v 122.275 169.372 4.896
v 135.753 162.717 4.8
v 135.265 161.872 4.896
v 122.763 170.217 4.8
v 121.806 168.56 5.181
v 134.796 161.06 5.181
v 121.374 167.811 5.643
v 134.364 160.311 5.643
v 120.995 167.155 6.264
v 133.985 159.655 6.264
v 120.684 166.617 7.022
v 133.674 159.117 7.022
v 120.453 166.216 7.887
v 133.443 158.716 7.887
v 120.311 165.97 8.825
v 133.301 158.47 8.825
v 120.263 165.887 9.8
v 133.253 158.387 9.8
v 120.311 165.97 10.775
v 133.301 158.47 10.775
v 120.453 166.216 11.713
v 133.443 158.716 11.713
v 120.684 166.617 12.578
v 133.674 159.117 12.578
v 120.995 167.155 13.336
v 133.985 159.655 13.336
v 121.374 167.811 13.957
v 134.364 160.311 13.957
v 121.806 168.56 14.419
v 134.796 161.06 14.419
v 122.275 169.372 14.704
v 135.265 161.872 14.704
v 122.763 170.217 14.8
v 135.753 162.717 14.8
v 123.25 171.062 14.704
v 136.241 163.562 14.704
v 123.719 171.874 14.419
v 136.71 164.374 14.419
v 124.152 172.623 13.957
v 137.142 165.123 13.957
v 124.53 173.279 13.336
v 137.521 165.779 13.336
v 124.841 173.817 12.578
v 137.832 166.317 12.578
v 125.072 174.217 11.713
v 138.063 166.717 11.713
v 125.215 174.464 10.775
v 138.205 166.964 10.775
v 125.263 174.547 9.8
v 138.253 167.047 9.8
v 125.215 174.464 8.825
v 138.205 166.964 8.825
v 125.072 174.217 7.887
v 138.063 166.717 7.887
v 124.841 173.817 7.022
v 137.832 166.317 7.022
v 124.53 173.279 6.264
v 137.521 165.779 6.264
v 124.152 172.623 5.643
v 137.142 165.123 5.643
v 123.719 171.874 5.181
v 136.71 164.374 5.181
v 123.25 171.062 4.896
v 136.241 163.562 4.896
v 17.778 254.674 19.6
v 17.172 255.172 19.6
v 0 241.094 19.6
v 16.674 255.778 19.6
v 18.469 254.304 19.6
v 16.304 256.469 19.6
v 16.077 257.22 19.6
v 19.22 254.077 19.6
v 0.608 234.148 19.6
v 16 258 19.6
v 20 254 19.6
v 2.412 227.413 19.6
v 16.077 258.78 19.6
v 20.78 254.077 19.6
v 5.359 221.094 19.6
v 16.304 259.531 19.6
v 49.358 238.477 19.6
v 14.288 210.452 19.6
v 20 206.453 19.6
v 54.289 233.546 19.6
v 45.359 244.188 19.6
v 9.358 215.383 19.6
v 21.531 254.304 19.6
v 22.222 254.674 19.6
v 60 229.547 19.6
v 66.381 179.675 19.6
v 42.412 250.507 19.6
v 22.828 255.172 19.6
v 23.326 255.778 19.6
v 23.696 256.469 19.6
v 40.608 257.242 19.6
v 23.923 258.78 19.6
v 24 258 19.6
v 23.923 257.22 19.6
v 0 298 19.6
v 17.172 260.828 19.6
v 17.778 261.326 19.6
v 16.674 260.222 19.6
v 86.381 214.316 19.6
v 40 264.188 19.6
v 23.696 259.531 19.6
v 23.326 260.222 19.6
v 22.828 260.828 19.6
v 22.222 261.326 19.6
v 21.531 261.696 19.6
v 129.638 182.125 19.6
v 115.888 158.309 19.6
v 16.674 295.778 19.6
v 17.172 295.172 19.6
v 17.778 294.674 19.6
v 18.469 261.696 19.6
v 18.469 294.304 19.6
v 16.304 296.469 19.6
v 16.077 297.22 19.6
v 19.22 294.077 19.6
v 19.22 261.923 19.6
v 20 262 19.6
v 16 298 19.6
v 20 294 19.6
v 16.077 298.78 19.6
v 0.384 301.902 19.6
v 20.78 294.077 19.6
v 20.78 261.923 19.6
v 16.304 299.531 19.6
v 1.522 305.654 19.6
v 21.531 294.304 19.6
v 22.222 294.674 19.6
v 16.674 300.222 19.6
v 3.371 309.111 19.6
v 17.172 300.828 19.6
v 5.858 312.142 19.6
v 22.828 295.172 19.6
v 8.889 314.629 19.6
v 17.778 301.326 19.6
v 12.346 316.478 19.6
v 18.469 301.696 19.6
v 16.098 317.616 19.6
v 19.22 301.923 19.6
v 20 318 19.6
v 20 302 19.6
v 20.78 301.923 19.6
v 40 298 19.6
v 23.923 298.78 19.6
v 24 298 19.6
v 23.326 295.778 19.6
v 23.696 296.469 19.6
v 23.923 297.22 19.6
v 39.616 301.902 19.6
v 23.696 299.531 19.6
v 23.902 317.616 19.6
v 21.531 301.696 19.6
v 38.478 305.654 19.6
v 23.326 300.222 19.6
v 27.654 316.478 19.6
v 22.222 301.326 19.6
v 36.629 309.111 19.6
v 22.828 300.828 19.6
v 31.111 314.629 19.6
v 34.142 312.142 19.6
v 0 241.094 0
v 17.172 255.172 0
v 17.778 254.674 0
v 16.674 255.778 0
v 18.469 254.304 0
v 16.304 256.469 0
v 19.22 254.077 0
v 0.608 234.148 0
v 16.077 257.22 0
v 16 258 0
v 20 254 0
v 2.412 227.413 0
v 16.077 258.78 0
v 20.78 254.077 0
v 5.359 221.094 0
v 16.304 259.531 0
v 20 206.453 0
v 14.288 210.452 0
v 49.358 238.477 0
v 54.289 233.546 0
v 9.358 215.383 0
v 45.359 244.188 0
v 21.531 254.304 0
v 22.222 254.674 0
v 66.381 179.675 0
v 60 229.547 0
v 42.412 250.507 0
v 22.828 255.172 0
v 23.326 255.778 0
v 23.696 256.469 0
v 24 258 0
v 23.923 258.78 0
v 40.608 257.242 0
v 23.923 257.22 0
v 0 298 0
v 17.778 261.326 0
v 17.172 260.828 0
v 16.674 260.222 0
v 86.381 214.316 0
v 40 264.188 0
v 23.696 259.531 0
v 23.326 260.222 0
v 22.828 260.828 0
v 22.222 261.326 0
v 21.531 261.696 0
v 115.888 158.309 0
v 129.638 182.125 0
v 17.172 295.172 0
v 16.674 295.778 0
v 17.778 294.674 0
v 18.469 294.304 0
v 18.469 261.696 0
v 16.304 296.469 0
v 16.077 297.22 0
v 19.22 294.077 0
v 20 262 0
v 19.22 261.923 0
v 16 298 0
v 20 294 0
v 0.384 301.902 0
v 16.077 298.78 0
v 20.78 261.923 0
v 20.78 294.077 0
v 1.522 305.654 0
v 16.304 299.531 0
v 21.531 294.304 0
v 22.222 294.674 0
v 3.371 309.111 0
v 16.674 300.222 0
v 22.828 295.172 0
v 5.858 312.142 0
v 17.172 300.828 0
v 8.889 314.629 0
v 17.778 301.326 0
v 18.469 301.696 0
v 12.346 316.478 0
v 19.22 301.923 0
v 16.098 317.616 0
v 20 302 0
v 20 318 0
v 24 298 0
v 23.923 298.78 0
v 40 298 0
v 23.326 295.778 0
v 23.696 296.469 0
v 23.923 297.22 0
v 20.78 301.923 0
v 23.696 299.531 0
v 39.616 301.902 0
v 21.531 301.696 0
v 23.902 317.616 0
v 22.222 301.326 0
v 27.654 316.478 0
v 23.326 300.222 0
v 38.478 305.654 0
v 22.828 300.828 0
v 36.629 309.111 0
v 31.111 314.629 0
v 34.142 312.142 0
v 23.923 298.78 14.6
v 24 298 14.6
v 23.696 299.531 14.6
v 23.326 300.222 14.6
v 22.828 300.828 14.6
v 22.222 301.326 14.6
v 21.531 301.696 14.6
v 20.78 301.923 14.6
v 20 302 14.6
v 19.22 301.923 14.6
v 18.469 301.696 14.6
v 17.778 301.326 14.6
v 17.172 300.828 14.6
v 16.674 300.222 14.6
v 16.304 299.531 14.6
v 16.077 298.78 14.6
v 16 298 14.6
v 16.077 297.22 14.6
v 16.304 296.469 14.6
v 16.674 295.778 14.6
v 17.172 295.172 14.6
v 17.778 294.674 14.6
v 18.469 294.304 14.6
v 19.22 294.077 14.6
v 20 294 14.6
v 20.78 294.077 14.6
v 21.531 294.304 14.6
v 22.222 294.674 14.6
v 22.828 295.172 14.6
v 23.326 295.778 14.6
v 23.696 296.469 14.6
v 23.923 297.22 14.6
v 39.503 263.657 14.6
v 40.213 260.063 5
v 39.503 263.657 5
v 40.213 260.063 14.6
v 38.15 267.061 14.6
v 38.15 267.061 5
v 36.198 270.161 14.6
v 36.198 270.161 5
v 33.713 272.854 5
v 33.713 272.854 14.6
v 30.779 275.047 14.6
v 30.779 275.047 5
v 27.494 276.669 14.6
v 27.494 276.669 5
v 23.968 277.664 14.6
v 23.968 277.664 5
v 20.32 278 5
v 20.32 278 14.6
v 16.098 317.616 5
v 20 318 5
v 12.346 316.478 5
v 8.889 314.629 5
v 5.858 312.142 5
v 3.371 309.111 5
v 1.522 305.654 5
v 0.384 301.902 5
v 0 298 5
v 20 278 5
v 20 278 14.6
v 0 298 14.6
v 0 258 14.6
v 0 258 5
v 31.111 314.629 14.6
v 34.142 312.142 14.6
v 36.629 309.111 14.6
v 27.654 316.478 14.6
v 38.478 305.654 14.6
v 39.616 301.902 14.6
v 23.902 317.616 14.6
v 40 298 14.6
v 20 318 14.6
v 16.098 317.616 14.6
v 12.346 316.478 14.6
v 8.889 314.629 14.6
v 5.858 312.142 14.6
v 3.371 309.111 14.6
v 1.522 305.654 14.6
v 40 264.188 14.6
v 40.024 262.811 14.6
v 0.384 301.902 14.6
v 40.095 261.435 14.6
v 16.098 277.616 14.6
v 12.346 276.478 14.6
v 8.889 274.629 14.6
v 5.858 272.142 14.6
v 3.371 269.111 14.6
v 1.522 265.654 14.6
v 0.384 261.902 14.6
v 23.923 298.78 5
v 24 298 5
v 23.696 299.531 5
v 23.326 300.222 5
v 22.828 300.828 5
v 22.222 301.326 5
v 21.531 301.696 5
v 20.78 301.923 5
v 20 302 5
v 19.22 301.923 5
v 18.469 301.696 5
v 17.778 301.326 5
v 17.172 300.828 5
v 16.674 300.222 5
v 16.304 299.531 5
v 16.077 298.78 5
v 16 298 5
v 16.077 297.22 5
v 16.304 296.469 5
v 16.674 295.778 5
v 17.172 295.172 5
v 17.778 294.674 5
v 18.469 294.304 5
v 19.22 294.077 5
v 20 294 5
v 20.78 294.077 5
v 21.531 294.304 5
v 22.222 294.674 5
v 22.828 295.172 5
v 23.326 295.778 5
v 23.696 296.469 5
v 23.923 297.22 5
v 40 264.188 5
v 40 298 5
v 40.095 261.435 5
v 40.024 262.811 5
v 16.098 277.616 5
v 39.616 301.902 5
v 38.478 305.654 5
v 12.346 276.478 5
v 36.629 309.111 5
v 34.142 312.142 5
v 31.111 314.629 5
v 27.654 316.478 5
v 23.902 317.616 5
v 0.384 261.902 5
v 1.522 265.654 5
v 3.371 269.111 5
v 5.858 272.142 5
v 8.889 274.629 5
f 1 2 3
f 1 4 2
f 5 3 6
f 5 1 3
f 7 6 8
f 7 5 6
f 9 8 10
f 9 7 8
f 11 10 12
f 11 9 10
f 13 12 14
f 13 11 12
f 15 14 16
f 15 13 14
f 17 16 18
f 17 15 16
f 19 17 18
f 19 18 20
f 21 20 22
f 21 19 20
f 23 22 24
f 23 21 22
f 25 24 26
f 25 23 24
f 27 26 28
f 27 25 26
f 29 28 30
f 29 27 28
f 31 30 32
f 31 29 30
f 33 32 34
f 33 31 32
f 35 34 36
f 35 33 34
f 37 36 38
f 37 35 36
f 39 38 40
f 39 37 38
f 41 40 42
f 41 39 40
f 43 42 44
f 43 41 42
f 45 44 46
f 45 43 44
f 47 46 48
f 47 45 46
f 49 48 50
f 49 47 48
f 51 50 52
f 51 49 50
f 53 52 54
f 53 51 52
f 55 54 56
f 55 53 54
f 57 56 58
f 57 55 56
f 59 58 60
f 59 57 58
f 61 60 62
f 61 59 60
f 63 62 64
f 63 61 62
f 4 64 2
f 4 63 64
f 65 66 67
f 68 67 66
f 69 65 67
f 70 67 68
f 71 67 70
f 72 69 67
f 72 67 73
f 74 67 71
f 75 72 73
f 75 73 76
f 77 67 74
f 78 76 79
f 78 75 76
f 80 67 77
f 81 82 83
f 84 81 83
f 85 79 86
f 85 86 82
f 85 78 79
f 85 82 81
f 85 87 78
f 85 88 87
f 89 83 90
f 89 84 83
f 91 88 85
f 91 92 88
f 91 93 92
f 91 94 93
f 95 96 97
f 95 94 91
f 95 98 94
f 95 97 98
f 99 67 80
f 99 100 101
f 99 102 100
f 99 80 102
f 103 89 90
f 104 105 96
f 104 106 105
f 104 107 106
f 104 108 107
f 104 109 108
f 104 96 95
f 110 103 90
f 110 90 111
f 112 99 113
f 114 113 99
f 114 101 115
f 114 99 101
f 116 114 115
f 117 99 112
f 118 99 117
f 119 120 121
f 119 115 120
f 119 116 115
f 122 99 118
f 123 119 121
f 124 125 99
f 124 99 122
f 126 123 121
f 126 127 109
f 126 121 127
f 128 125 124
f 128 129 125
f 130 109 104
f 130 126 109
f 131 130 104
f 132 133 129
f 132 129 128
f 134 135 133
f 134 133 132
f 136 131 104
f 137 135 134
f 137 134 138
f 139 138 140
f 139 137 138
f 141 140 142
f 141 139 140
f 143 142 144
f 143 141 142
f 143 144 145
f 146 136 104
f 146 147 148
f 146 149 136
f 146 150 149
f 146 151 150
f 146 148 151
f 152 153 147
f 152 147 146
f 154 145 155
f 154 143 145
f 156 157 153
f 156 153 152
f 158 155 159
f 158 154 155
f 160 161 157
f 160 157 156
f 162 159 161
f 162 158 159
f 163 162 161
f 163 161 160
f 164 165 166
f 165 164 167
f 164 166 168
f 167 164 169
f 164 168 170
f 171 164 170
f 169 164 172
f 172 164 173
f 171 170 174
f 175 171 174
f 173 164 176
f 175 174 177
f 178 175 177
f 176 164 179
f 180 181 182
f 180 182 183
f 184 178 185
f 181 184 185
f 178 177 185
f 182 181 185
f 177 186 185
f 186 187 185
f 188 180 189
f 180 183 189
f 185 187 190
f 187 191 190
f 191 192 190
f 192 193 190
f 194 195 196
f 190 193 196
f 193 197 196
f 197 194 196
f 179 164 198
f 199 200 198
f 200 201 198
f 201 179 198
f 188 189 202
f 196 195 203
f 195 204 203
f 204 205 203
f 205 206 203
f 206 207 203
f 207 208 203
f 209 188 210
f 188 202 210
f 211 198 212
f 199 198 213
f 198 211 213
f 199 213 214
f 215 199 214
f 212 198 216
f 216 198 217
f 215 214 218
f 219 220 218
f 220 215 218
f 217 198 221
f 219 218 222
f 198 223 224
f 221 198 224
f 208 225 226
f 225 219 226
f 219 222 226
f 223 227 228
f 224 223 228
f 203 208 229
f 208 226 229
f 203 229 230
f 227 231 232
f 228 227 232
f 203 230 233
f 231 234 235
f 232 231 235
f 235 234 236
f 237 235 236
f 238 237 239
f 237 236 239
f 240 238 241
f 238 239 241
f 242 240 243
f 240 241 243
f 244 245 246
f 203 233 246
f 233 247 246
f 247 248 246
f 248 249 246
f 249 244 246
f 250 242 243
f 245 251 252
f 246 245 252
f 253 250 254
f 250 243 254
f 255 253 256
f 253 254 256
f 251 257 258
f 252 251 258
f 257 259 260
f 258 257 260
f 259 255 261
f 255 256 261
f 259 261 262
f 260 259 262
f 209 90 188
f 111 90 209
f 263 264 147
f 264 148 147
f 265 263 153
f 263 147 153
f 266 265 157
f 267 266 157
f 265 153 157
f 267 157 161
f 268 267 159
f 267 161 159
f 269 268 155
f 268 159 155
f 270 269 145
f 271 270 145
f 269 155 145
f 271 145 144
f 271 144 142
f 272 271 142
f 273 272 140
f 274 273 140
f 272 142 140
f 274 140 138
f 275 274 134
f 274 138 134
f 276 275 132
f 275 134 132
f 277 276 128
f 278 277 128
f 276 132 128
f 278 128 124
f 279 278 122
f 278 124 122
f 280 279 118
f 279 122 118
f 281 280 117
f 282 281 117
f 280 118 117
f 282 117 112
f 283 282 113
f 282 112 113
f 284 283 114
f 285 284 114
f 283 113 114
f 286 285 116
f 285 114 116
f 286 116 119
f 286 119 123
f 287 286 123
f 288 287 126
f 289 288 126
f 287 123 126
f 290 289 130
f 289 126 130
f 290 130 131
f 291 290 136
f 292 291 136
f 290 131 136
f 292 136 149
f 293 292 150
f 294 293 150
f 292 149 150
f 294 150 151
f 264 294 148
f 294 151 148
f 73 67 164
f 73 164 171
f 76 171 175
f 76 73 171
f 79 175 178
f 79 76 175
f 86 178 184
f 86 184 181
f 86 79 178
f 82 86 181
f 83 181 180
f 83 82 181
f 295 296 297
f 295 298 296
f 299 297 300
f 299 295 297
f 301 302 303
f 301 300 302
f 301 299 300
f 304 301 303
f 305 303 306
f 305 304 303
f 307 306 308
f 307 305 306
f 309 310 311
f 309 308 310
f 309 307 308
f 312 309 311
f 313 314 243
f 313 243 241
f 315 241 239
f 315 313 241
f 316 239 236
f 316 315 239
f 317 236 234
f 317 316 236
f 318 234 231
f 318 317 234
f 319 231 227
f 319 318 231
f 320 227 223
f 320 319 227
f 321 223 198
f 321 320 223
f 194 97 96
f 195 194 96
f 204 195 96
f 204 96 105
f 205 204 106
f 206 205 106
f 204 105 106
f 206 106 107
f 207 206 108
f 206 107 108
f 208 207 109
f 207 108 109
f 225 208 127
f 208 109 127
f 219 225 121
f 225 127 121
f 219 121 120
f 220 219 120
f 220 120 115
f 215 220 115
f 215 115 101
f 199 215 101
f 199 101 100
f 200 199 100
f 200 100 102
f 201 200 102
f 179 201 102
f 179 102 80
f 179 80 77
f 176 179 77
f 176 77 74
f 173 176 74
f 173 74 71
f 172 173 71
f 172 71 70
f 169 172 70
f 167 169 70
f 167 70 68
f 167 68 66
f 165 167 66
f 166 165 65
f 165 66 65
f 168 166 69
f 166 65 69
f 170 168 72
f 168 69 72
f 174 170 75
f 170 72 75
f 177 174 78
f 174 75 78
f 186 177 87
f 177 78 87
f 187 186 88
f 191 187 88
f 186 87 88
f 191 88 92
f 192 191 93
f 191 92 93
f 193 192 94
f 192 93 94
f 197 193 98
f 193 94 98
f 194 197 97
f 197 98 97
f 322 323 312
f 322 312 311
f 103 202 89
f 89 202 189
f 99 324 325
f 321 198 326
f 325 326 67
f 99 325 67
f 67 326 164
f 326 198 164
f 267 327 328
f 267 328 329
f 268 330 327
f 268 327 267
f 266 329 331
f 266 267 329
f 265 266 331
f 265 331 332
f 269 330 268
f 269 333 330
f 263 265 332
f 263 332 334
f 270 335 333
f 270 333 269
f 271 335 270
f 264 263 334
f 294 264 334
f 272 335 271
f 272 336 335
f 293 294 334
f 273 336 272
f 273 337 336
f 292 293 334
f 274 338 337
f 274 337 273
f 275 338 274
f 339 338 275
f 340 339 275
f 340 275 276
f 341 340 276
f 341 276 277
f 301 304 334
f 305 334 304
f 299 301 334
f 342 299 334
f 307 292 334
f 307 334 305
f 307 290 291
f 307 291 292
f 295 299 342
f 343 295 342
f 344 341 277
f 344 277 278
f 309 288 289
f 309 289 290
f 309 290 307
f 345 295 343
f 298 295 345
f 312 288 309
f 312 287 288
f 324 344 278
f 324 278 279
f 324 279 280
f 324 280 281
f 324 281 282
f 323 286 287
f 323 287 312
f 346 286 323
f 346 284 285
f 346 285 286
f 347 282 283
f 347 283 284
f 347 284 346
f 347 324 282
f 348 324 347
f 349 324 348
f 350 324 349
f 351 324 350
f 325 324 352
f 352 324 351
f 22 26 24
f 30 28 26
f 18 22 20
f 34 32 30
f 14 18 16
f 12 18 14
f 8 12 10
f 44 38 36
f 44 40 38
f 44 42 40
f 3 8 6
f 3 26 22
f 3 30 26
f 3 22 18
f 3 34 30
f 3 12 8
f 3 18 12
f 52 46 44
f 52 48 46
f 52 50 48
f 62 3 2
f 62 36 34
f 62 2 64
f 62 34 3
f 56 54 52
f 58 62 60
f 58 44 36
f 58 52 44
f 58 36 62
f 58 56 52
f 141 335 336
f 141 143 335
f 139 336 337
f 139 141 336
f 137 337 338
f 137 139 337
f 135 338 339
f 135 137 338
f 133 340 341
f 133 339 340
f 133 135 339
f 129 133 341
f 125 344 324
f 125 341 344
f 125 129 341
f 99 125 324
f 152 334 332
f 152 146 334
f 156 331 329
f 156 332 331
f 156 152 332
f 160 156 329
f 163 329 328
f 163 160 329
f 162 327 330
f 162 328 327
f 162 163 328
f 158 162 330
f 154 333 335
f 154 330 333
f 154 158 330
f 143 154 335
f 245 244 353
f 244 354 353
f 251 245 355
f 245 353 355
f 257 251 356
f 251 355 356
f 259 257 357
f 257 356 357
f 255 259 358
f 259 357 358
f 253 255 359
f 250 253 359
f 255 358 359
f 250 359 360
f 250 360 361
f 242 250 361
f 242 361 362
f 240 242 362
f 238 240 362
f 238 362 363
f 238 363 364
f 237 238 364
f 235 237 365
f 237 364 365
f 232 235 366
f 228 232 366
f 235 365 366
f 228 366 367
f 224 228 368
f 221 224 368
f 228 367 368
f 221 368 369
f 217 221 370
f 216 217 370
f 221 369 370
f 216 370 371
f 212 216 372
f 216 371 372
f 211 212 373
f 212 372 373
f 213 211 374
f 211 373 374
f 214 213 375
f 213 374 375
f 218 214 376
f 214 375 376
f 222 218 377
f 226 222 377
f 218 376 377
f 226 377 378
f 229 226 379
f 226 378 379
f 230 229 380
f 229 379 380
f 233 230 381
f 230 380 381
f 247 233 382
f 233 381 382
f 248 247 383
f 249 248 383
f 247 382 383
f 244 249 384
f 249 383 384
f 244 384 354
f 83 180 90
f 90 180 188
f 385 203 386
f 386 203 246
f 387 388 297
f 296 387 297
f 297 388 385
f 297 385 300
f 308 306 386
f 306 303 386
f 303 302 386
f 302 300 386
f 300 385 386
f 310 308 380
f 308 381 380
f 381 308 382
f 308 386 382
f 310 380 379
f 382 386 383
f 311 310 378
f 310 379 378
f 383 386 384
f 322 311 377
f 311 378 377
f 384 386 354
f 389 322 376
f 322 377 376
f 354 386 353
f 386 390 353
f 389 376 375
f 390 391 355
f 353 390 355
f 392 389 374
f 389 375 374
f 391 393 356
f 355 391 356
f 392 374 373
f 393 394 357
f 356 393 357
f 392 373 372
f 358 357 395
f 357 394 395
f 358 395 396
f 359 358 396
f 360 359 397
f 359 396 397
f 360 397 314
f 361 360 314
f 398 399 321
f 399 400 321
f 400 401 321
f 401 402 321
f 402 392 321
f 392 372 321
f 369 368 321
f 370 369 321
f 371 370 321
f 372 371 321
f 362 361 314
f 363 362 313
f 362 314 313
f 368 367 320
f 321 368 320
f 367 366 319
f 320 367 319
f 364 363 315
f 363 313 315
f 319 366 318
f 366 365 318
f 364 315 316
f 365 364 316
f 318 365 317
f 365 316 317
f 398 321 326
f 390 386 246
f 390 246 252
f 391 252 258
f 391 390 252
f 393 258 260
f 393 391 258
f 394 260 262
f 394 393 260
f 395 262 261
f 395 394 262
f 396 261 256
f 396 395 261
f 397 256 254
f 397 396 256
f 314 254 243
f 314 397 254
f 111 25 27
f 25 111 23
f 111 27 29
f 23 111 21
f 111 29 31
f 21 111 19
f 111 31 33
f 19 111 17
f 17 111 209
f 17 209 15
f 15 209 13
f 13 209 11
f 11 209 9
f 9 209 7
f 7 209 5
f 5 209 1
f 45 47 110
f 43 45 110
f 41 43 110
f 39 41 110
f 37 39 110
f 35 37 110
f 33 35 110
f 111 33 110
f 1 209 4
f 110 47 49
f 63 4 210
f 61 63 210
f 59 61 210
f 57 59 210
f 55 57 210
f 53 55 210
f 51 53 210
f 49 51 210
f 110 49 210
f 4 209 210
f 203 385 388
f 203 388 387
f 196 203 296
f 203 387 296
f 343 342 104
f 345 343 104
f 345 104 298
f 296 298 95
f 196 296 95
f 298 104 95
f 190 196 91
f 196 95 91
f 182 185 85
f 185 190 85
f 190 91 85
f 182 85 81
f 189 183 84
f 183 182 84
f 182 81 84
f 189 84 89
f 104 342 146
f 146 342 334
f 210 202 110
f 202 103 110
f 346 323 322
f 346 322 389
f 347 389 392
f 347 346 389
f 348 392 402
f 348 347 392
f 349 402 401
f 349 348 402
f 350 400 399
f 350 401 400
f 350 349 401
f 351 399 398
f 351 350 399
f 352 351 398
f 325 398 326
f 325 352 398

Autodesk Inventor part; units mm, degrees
ref_plane "YZ Plane" through (0, 0, 0) normal (1, 0, 0) x (0, 1, 0)
ref_plane "XZ Plane" through (0, 0, 0) normal (0, 1, 0) x (-1, 0, 0)
ref_plane "XY Plane" through (0, 0, 0) normal (0, 0, 1) x (1, 0, 0)
sketch "スケッチ1" plane through (0, 0, 0) normal (0, 0, 1) x (1, 0, 0)
  line L0 (0, 0) -> (40, 0)
  line L1 (40, 0) -> (40, 318)
  line L2 (40, 318) -> (0, 318)
  line L3 (0, 318) -> (0, 0)
  line L4 (0, 218) -> (112.7627, 152.8964)
  line L5 (112.7627, 152.8964) -> (132.7627, 187.5375)
  line L6 (132.7627, 187.5375) -> (40, 241.094)
  point P0 (40, 218)
  point P1 (40, 194.906)
  point P2 (20, 318)
  point P3 (122.7627, 170.2169)
  point P4 (20, 258)
  dimension "d0" = 40
  dimension "d1" = 318
  dimension "d69" = 40
  dimension "d70" = 60
  dimension "d91" = 20
  dimension "d92" = 100
  dimension "d93" = 180
  dimension "d96" = 20
  dimension "d97" = 60
extrude "押し出し1" add sketch "スケッチ1" along normal blind 19.6 contours L3 L2 L1 L4 | L1 L6 L5 L4
sketch "スケッチ6" plane through (0, 0, 19.6) normal (0, 0, 1) x (1, 0, 0)
  circle A0 centre (20, 258) radius 4
  line L0 (40, 318) -> (0, 318) projected
  line L1 (40, 241.094) -> (40, 318) projected
  circle A1 centre (20, 20) radius 1.2295
  circle A2 centre (20, 10) radius 1.2295
  line L2 (0, 0) -> (40, 0) projected
  circle A3 centre (20, 298) radius 4
  point P0 (20, 318)
  point P1 (40, 190.8114)
  point P2 (30, 0)
  dimension "d42" = 8
  dimension "d44" = 20
  dimension "d45" = 2.459
  dimension "d46" = 2.459
  dimension "d47" = 10
  dimension "d48" = 10
  dimension "d49" = 20
  dimension "d50" = 20
  dimension "d53" = 8
  dimension "d54" = 20
  dimension "d55" = 40
  dimension "d56" = 20
extrude "押し出し4" cut sketch "スケッチ6" against normal through all
sketch "スケッチ8" plane through (0, 0, 0) normal (-1, 0, 0) x (0, 0, 1)
  line L0 (0, 318) -> (19.6, 318) projected
  line L1 (5, 318) -> (14.6, 318)
  line L2 (14.6, 318) -> (14.6, 278)
  line L3 (14.6, 278) -> (5, 278)
  line L4 (5, 278) -> (5, 318)
  line L5 (0, 318) -> (0, 0) projected
  dimension "d57" = 5
  dimension "d58" = 9.6
  dimension "d59" = 40
  dimension "d98" = 19.6
extrude "押し出し5" cut sketch "スケッチ8" against normal through all
fillet "フィレット1" radius 20 4 edges at (40, 318, 17.1) (40, 318, 2.5) (0, 318, 2.5) (0, 318, 17.1)
fillet "フィレット2" radius 40 2 edges at (0, 218, 9.8) (40, 241.094, 9.8)
sketch "スケッチ9" plane through (0, 0, 19.6) normal (0, 0, 1) x (1, 0, 0)
  line L0 (20, 206.453) -> (112.7627, 152.8964) projected
  line L1 (132.7627, 187.5375) -> (60, 229.547) projected
  line L2 (112.7627, 152.8964) -> (132.7627, 187.5375) projected
  line L3 (132.7627, 187.5375) -> (112.7627, 152.8964)
  line L4 (66.3813, 179.6747) -> (112.7627, 152.8964)
  line L5 (132.7627, 187.5375) -> (166.773, 167.9016)
  line L6 (115.1204, 126.9801) -> (133.5174, 158.8446)
  line L7 (141.7531, 173.1092) -> (128.7627, 180.6092)
  line L8 (112.7627, 152.8964) -> (20, 206.453)
  line L9 (132.7627, 187.5375) -> (60, 229.547)
  line L10 (115.1204, 126.9801) -> (125.7531, 145.3964)
  line L11 (133.5174, 158.8446) -> (145.7531, 180.0375)
  line L12 (116.7627, 159.8246) -> (129.7531, 152.3246)
  line L13 (66.3813, 179.6747) -> (129.7531, 152.3246)
  line L14 (66.3813, 179.6747) -> (86.3813, 214.3157)
  line L15 (86.3813, 214.3157) -> (141.7531, 173.1092)
  point P0 (0, 0)
  point P1 (254.4532, 80.329)
  point P2 (128.7627, 180.6092)
  point P3 (123.2579, 156.0746)
  point P4 (86.3813, 214.3157)
  point P5 (40, 194.906)
  point P6 (115.8875, 158.3088)
  point P7 (129.6379, 182.1251)
  dimension "d80" = 24
  dimension "d81" = 40
  dimension "d83" = 15
  dimension "d84" = 8
  dimension "d90" = 24
extrude "押し出し6" cut sketch "スケッチ9" against normal through all contours L13 L2 L0 | L1 L2 L15
sketch "スケッチ11" plane through (104.9897, 139.4332, 24) normal (0.8660254, -0.5, 0) x (0, 0, -1)
  line L0 (4.4, 21.7957) -> (4.4, 49.2964) projected
  line L1 (24, 21.7957) -> (24, 49.2964) projected
  line L2 (0, 24) -> (24, 24)
  line L3 (24, 24) -> (24, 0)
  line L4 (24, 0) -> (0, 0)
  line L5 (0, 0) -> (0, 24)
  line L6 (17, 17) -> (7, 17)
  line L7 (7, 17) -> (7, 7)
  line L8 (7, 7) -> (17, 7)
  line L9 (17, 7) -> (17, 17)
  line L10 (4.4, 35.546) -> (24, 35.546) projected
  circle A0 centre (14.2, 35.546) radius 5
  point P0 (24, -173.2475)
  point P1 (24, 24)
  point P2 (0, 15.546)
  point P3 (24, 15.546)
  dimension "d85" = 10
  dimension "d88" = 10
extrude "押し出し7" add sketch "スケッチ11" along normal blind 15 contours A0 L10 | L10 A0
fillet "フィレット4" radius 20 2 edges at (0, 278, 9.8) (40, 278, 9.8)
equation "\"d45\" = d46"
equation "\"d48\" = d47"
equation "\"d50\" = d49"
properties part number "legparts_06(seven)" material "ABS プラスチック"
